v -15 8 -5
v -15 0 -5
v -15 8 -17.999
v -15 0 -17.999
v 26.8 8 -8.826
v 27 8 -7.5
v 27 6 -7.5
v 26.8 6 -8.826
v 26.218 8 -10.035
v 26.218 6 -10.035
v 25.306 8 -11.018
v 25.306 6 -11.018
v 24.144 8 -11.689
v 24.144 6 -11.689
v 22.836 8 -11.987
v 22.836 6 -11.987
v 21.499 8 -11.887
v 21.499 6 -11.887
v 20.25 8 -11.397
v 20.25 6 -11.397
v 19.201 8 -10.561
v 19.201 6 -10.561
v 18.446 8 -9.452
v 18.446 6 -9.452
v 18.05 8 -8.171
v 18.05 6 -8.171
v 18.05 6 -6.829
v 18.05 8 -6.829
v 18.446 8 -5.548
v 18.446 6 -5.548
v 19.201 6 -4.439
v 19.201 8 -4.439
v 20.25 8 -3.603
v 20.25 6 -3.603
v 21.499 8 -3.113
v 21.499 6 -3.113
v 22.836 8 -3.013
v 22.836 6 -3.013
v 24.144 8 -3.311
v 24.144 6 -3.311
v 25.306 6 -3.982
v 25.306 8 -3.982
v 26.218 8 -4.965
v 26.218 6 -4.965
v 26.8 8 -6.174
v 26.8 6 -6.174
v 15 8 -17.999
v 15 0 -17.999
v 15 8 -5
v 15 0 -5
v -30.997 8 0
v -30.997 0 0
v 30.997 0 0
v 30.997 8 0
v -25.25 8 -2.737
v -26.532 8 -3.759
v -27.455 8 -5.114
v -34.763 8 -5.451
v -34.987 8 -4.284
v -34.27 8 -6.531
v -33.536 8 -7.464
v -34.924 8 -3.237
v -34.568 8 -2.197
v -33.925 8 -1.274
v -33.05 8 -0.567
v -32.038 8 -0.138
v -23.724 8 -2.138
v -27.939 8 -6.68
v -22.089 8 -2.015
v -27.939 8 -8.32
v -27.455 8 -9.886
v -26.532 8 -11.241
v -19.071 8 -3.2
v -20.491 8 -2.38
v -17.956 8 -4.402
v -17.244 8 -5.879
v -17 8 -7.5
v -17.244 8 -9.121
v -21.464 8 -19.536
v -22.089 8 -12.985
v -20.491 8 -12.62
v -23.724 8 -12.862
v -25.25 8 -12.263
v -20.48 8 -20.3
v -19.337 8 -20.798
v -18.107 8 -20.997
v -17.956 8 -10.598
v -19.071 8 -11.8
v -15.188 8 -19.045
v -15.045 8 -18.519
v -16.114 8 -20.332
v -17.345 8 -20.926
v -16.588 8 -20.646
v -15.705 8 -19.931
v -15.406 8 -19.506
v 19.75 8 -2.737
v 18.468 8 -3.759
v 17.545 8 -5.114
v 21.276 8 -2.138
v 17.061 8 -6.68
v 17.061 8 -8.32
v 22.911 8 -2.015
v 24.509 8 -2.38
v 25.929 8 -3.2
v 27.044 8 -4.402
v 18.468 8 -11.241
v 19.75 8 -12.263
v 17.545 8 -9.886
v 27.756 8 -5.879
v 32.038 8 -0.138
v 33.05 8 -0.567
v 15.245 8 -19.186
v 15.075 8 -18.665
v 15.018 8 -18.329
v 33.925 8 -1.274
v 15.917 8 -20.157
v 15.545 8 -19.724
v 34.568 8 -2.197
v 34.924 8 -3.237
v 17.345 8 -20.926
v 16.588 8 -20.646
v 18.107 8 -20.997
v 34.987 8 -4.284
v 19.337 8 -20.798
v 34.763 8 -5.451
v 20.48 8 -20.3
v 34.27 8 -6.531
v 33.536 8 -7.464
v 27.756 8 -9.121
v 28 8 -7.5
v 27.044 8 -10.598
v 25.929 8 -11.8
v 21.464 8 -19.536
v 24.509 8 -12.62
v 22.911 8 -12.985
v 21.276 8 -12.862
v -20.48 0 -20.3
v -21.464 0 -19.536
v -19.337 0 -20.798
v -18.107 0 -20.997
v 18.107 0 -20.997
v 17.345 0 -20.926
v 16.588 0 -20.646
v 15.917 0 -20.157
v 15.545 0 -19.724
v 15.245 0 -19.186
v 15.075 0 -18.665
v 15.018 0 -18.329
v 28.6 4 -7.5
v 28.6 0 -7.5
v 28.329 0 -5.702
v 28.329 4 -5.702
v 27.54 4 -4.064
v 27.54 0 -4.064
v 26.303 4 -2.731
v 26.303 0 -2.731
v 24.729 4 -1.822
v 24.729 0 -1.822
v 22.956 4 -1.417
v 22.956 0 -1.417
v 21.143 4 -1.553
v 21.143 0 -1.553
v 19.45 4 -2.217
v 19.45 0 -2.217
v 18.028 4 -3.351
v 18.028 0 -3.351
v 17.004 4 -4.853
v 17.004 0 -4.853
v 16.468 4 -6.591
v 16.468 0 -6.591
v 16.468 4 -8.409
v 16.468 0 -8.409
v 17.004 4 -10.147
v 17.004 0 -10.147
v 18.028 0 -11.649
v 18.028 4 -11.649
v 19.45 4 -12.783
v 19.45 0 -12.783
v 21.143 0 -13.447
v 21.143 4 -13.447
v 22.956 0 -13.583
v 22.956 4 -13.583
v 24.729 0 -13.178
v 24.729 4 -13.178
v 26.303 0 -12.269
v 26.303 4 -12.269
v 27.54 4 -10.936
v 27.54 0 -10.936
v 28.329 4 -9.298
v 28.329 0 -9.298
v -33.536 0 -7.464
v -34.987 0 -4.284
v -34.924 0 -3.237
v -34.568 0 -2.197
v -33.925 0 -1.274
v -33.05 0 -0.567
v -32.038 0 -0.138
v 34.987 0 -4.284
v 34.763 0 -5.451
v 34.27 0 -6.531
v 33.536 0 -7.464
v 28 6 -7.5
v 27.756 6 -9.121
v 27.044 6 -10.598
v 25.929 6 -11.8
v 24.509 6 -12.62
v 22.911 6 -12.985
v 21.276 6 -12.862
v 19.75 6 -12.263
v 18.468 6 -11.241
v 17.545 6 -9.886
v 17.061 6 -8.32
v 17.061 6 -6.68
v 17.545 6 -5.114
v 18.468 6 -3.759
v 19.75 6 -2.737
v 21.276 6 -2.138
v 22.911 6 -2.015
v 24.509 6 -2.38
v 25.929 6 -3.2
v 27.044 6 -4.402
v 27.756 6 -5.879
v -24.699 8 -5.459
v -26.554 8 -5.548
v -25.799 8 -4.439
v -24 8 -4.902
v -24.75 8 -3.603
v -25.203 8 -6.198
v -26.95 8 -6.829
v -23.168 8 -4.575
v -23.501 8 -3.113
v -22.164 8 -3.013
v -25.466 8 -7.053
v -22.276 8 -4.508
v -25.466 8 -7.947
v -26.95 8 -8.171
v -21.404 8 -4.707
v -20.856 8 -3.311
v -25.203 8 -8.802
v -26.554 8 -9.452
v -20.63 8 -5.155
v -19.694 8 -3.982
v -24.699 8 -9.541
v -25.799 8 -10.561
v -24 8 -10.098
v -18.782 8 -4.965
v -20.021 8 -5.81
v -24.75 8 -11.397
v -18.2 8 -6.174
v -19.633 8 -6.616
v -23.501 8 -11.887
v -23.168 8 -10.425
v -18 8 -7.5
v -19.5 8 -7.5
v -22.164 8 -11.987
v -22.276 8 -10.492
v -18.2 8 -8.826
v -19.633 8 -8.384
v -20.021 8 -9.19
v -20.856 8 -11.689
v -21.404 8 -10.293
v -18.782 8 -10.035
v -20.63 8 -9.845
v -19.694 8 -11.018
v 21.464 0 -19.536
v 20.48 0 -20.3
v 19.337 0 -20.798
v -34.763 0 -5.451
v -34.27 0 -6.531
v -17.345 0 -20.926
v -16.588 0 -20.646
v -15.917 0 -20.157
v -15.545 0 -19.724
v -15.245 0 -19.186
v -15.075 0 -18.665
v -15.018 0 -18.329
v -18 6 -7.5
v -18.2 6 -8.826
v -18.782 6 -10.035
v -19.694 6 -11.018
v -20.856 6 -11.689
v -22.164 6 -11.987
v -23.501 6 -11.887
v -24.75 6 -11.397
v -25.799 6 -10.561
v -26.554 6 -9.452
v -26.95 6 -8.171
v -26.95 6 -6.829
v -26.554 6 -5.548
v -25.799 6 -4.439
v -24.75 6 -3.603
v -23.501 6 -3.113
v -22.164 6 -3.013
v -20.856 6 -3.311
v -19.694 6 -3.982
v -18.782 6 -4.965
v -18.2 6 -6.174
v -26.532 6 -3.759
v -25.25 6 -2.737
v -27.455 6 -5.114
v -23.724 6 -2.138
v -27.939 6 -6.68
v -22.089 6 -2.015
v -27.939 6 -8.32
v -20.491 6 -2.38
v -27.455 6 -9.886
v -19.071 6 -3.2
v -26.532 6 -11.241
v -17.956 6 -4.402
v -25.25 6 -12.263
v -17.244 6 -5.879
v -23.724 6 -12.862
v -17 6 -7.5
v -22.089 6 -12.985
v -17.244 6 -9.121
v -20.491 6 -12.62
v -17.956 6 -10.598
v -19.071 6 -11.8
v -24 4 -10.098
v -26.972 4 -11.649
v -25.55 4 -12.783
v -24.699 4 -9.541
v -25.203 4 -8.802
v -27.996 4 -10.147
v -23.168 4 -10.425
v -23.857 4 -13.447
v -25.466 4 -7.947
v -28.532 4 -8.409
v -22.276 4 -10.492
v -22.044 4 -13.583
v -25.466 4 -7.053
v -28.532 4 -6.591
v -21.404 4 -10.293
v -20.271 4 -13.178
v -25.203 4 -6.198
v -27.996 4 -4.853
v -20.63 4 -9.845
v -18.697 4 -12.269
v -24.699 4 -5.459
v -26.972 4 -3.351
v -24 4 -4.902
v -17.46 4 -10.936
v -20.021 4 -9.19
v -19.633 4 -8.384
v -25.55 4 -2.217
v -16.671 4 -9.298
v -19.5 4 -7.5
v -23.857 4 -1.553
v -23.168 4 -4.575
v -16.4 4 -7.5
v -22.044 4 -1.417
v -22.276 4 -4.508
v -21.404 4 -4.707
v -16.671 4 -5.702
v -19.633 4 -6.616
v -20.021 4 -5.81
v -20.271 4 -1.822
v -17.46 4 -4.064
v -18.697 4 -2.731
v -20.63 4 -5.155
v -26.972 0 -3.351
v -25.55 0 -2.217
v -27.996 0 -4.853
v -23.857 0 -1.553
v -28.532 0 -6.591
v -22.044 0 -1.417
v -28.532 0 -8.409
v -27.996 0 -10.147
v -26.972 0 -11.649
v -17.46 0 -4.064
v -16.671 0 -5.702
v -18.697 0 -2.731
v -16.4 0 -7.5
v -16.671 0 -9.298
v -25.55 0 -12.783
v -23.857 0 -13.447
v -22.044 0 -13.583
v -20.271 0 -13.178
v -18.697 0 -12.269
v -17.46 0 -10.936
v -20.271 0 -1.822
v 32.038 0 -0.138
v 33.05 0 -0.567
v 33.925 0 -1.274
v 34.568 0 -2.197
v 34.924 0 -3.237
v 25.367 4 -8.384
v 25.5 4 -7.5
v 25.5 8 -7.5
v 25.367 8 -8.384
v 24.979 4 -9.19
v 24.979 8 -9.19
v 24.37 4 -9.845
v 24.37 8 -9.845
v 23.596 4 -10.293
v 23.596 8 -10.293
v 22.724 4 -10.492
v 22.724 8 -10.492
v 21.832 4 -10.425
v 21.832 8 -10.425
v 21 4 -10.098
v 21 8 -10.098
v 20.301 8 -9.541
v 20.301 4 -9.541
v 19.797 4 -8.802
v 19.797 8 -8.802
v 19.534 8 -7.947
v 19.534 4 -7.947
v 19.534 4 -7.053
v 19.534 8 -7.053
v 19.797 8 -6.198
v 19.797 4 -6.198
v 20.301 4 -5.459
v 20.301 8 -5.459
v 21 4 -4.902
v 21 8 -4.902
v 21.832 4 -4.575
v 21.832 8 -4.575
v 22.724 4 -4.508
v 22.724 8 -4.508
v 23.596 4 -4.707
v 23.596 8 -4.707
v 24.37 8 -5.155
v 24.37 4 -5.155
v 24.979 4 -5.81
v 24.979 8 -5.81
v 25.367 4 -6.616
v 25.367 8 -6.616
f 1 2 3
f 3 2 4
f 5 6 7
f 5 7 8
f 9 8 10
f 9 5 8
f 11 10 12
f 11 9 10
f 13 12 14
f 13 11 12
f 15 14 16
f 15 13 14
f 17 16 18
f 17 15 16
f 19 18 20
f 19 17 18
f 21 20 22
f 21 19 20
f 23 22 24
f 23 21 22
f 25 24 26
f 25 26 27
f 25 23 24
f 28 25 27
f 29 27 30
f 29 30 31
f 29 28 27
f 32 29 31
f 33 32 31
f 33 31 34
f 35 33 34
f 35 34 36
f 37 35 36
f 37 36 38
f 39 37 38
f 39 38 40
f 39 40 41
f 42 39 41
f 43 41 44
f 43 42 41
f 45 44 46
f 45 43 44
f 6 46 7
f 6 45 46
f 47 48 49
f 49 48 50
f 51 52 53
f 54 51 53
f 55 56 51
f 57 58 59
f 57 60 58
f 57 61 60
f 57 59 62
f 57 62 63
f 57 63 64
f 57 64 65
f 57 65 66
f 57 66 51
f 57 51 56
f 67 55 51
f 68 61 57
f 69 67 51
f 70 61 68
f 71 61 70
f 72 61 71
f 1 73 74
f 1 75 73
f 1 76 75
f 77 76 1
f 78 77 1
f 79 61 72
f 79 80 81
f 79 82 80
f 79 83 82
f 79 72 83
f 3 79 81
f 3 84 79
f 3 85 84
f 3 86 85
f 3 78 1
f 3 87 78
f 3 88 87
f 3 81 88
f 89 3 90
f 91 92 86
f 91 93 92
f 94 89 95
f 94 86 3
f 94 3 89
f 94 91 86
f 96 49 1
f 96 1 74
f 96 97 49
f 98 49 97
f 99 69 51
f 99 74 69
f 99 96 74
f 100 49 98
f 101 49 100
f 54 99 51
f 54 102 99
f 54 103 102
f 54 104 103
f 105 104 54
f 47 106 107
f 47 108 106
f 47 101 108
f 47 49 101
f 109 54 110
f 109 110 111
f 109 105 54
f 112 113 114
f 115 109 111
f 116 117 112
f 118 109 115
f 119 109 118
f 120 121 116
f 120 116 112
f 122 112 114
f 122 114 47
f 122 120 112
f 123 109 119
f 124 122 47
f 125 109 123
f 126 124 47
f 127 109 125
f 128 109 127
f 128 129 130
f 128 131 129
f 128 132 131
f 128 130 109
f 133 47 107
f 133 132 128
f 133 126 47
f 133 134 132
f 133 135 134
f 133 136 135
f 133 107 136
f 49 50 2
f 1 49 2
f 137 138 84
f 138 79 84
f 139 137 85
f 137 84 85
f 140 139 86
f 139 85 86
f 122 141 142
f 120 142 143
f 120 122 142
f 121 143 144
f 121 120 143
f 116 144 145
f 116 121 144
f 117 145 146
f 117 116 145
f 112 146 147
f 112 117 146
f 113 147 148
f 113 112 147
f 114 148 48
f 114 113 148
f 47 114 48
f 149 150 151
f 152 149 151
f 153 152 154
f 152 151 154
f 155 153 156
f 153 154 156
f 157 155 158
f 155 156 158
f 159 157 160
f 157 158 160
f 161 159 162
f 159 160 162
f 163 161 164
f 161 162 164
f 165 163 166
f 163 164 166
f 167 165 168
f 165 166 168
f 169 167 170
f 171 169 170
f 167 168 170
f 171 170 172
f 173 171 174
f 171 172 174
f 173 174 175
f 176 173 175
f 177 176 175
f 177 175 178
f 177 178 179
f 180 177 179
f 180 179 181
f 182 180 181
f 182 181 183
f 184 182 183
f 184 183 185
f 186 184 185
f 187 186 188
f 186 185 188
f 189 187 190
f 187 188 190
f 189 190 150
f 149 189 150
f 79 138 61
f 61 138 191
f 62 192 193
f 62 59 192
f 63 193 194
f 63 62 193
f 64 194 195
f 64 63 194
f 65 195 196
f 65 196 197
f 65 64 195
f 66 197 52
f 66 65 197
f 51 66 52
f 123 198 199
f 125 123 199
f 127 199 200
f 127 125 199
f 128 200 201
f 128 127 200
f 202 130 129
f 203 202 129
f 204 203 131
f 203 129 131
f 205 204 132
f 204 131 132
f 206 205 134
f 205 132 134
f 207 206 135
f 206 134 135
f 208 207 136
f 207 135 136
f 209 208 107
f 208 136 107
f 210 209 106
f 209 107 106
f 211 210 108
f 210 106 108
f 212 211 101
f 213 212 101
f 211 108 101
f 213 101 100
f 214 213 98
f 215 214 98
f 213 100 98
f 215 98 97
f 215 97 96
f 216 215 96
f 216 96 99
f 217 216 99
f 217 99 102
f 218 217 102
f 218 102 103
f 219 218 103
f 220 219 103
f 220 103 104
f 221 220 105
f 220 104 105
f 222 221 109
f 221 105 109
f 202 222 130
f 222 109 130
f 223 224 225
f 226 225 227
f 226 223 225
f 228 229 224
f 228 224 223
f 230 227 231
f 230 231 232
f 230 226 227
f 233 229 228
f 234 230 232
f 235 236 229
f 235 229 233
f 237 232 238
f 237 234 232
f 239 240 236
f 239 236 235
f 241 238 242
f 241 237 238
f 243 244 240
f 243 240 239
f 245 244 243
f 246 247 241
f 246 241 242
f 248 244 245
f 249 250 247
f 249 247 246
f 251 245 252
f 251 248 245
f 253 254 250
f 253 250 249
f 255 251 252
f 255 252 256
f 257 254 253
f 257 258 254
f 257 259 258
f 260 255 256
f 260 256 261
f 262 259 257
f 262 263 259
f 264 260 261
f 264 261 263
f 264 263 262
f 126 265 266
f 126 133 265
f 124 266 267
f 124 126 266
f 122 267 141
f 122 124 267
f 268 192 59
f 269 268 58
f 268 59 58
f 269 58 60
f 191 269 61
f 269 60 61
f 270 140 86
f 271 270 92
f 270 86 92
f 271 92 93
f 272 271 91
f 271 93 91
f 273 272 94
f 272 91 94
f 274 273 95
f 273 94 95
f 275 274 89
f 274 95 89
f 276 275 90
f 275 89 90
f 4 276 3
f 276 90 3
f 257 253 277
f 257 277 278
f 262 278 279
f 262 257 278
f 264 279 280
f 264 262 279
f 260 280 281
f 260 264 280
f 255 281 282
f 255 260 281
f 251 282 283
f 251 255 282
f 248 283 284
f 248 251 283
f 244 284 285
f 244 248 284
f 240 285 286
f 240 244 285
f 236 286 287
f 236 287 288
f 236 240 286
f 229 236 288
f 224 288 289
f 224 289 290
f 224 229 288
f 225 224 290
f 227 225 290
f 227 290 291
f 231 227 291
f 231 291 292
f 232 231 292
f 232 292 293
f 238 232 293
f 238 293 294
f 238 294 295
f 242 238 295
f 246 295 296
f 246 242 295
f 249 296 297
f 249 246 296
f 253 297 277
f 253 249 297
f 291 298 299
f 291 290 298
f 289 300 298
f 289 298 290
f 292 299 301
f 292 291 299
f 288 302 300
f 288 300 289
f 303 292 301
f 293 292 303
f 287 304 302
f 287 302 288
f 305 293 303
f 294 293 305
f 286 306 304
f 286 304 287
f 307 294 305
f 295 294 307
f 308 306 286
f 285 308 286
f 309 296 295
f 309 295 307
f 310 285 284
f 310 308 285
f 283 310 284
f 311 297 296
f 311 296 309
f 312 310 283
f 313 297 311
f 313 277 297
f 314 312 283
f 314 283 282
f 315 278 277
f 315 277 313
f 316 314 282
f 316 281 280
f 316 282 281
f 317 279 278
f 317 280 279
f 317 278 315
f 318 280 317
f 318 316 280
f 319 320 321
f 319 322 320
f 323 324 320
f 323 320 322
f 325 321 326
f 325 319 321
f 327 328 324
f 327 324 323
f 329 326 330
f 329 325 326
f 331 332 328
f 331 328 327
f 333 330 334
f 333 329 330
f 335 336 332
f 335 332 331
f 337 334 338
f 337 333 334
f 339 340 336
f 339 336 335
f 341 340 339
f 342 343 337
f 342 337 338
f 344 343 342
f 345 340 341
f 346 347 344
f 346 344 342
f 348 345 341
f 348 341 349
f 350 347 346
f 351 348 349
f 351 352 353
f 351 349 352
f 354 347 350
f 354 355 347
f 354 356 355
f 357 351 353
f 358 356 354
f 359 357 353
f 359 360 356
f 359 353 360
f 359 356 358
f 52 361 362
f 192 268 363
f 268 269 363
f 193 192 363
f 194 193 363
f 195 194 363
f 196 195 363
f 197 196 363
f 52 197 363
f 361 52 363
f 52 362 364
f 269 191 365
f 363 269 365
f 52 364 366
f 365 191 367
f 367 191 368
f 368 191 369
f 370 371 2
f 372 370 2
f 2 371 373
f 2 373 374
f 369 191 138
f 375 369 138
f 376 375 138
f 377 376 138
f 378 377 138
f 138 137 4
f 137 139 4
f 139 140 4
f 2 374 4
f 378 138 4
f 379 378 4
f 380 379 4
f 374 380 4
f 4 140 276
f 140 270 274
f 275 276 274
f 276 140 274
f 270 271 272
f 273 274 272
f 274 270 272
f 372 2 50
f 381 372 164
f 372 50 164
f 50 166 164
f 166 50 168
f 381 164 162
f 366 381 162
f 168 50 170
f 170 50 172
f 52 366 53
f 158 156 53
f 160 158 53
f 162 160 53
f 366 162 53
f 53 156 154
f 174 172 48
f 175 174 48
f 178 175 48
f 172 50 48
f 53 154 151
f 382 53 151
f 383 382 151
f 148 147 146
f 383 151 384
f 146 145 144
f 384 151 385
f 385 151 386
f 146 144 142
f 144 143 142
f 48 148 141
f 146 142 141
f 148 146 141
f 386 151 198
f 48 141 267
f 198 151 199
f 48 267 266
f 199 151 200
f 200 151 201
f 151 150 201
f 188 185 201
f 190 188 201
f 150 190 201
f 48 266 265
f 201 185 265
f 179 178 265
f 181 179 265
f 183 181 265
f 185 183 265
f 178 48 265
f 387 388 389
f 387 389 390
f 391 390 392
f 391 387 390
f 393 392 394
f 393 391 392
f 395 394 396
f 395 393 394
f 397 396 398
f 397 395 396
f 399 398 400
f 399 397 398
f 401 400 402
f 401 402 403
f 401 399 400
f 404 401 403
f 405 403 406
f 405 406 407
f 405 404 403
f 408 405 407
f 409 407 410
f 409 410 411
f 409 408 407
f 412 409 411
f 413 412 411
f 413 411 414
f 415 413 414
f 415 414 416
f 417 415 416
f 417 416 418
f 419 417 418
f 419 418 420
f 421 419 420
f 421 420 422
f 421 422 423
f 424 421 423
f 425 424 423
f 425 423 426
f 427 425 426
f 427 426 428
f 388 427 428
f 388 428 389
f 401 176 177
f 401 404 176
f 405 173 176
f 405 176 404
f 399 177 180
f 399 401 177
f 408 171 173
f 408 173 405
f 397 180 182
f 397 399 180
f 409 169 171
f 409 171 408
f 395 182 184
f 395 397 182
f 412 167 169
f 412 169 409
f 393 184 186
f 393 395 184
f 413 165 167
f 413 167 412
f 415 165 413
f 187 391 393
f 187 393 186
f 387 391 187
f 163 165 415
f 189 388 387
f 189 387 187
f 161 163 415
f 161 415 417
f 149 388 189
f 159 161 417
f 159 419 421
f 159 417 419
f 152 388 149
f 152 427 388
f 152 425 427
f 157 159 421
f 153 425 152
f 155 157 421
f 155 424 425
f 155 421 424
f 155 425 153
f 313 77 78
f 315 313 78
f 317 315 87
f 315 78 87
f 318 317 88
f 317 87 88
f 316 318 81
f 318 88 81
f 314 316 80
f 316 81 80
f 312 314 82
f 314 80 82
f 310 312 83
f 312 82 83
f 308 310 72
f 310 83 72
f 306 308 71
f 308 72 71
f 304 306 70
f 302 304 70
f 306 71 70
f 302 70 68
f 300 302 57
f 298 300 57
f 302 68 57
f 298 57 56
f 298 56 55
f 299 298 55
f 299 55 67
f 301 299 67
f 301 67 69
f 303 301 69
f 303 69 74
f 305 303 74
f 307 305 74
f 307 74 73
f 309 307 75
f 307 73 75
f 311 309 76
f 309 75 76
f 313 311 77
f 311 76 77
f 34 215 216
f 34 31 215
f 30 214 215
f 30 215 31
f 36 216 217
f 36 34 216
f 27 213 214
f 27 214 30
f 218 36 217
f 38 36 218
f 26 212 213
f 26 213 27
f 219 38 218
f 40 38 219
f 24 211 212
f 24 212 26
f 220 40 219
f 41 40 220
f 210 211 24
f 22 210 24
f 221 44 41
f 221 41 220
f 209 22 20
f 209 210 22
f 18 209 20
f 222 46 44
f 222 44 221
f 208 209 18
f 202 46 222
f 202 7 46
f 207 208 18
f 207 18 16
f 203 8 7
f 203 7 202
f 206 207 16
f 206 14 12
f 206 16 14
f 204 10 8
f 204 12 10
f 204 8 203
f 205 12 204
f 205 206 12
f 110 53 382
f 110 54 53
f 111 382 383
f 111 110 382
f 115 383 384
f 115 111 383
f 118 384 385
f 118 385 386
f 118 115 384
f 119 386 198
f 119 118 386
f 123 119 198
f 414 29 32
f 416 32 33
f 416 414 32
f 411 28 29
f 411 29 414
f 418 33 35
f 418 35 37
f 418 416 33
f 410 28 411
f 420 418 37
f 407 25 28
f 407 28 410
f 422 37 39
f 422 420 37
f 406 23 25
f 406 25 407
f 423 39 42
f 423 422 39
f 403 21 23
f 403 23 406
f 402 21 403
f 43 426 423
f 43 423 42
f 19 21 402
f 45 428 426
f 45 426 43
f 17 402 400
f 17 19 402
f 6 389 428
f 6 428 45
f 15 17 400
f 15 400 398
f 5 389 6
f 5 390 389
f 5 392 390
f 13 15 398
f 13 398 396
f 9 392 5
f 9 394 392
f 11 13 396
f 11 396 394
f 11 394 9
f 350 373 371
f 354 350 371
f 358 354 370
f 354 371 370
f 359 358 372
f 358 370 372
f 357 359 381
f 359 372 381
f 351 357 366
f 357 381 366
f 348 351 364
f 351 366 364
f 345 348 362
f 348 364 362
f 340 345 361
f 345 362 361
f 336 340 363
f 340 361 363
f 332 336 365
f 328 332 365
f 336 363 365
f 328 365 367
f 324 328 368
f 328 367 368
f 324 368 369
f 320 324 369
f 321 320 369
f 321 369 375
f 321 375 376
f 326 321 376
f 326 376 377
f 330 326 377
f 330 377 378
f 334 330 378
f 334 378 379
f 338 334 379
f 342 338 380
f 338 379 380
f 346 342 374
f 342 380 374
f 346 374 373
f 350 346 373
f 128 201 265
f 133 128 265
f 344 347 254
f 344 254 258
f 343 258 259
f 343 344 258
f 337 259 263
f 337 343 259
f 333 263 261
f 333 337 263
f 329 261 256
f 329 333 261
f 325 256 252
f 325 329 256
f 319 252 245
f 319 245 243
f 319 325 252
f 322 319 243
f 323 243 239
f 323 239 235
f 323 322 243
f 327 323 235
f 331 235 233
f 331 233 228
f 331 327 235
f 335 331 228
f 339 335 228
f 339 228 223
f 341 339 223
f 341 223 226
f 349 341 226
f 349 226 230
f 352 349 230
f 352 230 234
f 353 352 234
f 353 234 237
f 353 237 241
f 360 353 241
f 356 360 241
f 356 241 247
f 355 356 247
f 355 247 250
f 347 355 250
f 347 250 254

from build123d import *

# Parameters (mm, degrees)
ESQUISSE1_R             = 3
BOSS_EXTRU_1_DEPTH      = 8
ESQUISSE3_R             = 5.5
ESQUISSE3_R_2           = 4.5
ENL_V_MAT_EXTRU_2_DEPTH = 2
ESQUISSE4_R             = 6.1
ENL_V_MAT_EXTRU_3_DEPTH = 4
CONG_1_R                = 5
CONG_2_R                = 3
CONG_3_R                = 4


with BuildPart() as part:
    # Esquisse1 → Boss.-Extru.1 (new body)
    with BuildSketch(Plane(origin=(0, 0, 0), x_dir=(1, 0, 0), z_dir=(0, 1, 0))):
        Polygon((-35, 0), (35, 0), (35, 6), (20, 21), (15, 21), (15, 5), (-15, 5), (-15, 21), (-20, 21), (-35, 6), align=None)
        with Locations((22.5, 7.5)):
            Circle(ESQUISSE1_R, mode=Mode.SUBTRACT)
        with Locations((-22.5, 7.5)):
            Circle(ESQUISSE1_R, mode=Mode.SUBTRACT)
    extrude(amount=BOSS_EXTRU_1_DEPTH)

    # Esquisse3 → Enlèv. mat.-Extru.2 (cut)
    with BuildSketch(Plane(origin=(0, 8, 0), x_dir=(1, 0, 0), z_dir=(0, 1, 0))):
        with Locations((-22.5, 7.5)):
            Circle(ESQUISSE3_R)
        with Locations((-22.5, 7.5)):
            Circle(ESQUISSE3_R_2, mode=Mode.SUBTRACT)
        with Locations((22.5, 7.5)):
            Circle(ESQUISSE3_R)
        with Locations((22.5, 7.5)):
            Circle(ESQUISSE3_R_2, mode=Mode.SUBTRACT)
    extrude(amount=-ENL_V_MAT_EXTRU_2_DEPTH, mode=Mode.SUBTRACT)

    # Esquisse4 → Enlèv. mat.-Extru.3 (cut)
    with BuildSketch(Plane.XZ):
        with Locations((-22.5, -7.5)):
            Circle(ESQUISSE4_R)
        with Locations((22.5, -7.5)):
            Circle(ESQUISSE4_R)
    extrude(amount=-ENL_V_MAT_EXTRU_3_DEPTH, mode=Mode.SUBTRACT)

    # Congé1
    cong_1_edges = [part.edges().sort_by_distance(p)[0] for p in [
        (-35, 4, -6),
        (-20, 4, -21),
        (20, 4, -21),
        (35, 4, -6),
    ]]
    fillet(cong_1_edges, radius=CONG_1_R)

    # Congé2
    cong_2_edges = [part.edges().sort_by_distance(p)[0] for p in [
        (15, 4, -21),
        (-15, 4, -21),
    ]]
    fillet(cong_2_edges, radius=CONG_2_R)

    # Congé3
    cong_3_edges = [part.edges().sort_by_distance(p)[0] for p in [
        (35, 4, 0),
        (-35, 4, 0),
    ]]
    fillet(cong_3_edges, radius=CONG_3_R)


solid = part.part
